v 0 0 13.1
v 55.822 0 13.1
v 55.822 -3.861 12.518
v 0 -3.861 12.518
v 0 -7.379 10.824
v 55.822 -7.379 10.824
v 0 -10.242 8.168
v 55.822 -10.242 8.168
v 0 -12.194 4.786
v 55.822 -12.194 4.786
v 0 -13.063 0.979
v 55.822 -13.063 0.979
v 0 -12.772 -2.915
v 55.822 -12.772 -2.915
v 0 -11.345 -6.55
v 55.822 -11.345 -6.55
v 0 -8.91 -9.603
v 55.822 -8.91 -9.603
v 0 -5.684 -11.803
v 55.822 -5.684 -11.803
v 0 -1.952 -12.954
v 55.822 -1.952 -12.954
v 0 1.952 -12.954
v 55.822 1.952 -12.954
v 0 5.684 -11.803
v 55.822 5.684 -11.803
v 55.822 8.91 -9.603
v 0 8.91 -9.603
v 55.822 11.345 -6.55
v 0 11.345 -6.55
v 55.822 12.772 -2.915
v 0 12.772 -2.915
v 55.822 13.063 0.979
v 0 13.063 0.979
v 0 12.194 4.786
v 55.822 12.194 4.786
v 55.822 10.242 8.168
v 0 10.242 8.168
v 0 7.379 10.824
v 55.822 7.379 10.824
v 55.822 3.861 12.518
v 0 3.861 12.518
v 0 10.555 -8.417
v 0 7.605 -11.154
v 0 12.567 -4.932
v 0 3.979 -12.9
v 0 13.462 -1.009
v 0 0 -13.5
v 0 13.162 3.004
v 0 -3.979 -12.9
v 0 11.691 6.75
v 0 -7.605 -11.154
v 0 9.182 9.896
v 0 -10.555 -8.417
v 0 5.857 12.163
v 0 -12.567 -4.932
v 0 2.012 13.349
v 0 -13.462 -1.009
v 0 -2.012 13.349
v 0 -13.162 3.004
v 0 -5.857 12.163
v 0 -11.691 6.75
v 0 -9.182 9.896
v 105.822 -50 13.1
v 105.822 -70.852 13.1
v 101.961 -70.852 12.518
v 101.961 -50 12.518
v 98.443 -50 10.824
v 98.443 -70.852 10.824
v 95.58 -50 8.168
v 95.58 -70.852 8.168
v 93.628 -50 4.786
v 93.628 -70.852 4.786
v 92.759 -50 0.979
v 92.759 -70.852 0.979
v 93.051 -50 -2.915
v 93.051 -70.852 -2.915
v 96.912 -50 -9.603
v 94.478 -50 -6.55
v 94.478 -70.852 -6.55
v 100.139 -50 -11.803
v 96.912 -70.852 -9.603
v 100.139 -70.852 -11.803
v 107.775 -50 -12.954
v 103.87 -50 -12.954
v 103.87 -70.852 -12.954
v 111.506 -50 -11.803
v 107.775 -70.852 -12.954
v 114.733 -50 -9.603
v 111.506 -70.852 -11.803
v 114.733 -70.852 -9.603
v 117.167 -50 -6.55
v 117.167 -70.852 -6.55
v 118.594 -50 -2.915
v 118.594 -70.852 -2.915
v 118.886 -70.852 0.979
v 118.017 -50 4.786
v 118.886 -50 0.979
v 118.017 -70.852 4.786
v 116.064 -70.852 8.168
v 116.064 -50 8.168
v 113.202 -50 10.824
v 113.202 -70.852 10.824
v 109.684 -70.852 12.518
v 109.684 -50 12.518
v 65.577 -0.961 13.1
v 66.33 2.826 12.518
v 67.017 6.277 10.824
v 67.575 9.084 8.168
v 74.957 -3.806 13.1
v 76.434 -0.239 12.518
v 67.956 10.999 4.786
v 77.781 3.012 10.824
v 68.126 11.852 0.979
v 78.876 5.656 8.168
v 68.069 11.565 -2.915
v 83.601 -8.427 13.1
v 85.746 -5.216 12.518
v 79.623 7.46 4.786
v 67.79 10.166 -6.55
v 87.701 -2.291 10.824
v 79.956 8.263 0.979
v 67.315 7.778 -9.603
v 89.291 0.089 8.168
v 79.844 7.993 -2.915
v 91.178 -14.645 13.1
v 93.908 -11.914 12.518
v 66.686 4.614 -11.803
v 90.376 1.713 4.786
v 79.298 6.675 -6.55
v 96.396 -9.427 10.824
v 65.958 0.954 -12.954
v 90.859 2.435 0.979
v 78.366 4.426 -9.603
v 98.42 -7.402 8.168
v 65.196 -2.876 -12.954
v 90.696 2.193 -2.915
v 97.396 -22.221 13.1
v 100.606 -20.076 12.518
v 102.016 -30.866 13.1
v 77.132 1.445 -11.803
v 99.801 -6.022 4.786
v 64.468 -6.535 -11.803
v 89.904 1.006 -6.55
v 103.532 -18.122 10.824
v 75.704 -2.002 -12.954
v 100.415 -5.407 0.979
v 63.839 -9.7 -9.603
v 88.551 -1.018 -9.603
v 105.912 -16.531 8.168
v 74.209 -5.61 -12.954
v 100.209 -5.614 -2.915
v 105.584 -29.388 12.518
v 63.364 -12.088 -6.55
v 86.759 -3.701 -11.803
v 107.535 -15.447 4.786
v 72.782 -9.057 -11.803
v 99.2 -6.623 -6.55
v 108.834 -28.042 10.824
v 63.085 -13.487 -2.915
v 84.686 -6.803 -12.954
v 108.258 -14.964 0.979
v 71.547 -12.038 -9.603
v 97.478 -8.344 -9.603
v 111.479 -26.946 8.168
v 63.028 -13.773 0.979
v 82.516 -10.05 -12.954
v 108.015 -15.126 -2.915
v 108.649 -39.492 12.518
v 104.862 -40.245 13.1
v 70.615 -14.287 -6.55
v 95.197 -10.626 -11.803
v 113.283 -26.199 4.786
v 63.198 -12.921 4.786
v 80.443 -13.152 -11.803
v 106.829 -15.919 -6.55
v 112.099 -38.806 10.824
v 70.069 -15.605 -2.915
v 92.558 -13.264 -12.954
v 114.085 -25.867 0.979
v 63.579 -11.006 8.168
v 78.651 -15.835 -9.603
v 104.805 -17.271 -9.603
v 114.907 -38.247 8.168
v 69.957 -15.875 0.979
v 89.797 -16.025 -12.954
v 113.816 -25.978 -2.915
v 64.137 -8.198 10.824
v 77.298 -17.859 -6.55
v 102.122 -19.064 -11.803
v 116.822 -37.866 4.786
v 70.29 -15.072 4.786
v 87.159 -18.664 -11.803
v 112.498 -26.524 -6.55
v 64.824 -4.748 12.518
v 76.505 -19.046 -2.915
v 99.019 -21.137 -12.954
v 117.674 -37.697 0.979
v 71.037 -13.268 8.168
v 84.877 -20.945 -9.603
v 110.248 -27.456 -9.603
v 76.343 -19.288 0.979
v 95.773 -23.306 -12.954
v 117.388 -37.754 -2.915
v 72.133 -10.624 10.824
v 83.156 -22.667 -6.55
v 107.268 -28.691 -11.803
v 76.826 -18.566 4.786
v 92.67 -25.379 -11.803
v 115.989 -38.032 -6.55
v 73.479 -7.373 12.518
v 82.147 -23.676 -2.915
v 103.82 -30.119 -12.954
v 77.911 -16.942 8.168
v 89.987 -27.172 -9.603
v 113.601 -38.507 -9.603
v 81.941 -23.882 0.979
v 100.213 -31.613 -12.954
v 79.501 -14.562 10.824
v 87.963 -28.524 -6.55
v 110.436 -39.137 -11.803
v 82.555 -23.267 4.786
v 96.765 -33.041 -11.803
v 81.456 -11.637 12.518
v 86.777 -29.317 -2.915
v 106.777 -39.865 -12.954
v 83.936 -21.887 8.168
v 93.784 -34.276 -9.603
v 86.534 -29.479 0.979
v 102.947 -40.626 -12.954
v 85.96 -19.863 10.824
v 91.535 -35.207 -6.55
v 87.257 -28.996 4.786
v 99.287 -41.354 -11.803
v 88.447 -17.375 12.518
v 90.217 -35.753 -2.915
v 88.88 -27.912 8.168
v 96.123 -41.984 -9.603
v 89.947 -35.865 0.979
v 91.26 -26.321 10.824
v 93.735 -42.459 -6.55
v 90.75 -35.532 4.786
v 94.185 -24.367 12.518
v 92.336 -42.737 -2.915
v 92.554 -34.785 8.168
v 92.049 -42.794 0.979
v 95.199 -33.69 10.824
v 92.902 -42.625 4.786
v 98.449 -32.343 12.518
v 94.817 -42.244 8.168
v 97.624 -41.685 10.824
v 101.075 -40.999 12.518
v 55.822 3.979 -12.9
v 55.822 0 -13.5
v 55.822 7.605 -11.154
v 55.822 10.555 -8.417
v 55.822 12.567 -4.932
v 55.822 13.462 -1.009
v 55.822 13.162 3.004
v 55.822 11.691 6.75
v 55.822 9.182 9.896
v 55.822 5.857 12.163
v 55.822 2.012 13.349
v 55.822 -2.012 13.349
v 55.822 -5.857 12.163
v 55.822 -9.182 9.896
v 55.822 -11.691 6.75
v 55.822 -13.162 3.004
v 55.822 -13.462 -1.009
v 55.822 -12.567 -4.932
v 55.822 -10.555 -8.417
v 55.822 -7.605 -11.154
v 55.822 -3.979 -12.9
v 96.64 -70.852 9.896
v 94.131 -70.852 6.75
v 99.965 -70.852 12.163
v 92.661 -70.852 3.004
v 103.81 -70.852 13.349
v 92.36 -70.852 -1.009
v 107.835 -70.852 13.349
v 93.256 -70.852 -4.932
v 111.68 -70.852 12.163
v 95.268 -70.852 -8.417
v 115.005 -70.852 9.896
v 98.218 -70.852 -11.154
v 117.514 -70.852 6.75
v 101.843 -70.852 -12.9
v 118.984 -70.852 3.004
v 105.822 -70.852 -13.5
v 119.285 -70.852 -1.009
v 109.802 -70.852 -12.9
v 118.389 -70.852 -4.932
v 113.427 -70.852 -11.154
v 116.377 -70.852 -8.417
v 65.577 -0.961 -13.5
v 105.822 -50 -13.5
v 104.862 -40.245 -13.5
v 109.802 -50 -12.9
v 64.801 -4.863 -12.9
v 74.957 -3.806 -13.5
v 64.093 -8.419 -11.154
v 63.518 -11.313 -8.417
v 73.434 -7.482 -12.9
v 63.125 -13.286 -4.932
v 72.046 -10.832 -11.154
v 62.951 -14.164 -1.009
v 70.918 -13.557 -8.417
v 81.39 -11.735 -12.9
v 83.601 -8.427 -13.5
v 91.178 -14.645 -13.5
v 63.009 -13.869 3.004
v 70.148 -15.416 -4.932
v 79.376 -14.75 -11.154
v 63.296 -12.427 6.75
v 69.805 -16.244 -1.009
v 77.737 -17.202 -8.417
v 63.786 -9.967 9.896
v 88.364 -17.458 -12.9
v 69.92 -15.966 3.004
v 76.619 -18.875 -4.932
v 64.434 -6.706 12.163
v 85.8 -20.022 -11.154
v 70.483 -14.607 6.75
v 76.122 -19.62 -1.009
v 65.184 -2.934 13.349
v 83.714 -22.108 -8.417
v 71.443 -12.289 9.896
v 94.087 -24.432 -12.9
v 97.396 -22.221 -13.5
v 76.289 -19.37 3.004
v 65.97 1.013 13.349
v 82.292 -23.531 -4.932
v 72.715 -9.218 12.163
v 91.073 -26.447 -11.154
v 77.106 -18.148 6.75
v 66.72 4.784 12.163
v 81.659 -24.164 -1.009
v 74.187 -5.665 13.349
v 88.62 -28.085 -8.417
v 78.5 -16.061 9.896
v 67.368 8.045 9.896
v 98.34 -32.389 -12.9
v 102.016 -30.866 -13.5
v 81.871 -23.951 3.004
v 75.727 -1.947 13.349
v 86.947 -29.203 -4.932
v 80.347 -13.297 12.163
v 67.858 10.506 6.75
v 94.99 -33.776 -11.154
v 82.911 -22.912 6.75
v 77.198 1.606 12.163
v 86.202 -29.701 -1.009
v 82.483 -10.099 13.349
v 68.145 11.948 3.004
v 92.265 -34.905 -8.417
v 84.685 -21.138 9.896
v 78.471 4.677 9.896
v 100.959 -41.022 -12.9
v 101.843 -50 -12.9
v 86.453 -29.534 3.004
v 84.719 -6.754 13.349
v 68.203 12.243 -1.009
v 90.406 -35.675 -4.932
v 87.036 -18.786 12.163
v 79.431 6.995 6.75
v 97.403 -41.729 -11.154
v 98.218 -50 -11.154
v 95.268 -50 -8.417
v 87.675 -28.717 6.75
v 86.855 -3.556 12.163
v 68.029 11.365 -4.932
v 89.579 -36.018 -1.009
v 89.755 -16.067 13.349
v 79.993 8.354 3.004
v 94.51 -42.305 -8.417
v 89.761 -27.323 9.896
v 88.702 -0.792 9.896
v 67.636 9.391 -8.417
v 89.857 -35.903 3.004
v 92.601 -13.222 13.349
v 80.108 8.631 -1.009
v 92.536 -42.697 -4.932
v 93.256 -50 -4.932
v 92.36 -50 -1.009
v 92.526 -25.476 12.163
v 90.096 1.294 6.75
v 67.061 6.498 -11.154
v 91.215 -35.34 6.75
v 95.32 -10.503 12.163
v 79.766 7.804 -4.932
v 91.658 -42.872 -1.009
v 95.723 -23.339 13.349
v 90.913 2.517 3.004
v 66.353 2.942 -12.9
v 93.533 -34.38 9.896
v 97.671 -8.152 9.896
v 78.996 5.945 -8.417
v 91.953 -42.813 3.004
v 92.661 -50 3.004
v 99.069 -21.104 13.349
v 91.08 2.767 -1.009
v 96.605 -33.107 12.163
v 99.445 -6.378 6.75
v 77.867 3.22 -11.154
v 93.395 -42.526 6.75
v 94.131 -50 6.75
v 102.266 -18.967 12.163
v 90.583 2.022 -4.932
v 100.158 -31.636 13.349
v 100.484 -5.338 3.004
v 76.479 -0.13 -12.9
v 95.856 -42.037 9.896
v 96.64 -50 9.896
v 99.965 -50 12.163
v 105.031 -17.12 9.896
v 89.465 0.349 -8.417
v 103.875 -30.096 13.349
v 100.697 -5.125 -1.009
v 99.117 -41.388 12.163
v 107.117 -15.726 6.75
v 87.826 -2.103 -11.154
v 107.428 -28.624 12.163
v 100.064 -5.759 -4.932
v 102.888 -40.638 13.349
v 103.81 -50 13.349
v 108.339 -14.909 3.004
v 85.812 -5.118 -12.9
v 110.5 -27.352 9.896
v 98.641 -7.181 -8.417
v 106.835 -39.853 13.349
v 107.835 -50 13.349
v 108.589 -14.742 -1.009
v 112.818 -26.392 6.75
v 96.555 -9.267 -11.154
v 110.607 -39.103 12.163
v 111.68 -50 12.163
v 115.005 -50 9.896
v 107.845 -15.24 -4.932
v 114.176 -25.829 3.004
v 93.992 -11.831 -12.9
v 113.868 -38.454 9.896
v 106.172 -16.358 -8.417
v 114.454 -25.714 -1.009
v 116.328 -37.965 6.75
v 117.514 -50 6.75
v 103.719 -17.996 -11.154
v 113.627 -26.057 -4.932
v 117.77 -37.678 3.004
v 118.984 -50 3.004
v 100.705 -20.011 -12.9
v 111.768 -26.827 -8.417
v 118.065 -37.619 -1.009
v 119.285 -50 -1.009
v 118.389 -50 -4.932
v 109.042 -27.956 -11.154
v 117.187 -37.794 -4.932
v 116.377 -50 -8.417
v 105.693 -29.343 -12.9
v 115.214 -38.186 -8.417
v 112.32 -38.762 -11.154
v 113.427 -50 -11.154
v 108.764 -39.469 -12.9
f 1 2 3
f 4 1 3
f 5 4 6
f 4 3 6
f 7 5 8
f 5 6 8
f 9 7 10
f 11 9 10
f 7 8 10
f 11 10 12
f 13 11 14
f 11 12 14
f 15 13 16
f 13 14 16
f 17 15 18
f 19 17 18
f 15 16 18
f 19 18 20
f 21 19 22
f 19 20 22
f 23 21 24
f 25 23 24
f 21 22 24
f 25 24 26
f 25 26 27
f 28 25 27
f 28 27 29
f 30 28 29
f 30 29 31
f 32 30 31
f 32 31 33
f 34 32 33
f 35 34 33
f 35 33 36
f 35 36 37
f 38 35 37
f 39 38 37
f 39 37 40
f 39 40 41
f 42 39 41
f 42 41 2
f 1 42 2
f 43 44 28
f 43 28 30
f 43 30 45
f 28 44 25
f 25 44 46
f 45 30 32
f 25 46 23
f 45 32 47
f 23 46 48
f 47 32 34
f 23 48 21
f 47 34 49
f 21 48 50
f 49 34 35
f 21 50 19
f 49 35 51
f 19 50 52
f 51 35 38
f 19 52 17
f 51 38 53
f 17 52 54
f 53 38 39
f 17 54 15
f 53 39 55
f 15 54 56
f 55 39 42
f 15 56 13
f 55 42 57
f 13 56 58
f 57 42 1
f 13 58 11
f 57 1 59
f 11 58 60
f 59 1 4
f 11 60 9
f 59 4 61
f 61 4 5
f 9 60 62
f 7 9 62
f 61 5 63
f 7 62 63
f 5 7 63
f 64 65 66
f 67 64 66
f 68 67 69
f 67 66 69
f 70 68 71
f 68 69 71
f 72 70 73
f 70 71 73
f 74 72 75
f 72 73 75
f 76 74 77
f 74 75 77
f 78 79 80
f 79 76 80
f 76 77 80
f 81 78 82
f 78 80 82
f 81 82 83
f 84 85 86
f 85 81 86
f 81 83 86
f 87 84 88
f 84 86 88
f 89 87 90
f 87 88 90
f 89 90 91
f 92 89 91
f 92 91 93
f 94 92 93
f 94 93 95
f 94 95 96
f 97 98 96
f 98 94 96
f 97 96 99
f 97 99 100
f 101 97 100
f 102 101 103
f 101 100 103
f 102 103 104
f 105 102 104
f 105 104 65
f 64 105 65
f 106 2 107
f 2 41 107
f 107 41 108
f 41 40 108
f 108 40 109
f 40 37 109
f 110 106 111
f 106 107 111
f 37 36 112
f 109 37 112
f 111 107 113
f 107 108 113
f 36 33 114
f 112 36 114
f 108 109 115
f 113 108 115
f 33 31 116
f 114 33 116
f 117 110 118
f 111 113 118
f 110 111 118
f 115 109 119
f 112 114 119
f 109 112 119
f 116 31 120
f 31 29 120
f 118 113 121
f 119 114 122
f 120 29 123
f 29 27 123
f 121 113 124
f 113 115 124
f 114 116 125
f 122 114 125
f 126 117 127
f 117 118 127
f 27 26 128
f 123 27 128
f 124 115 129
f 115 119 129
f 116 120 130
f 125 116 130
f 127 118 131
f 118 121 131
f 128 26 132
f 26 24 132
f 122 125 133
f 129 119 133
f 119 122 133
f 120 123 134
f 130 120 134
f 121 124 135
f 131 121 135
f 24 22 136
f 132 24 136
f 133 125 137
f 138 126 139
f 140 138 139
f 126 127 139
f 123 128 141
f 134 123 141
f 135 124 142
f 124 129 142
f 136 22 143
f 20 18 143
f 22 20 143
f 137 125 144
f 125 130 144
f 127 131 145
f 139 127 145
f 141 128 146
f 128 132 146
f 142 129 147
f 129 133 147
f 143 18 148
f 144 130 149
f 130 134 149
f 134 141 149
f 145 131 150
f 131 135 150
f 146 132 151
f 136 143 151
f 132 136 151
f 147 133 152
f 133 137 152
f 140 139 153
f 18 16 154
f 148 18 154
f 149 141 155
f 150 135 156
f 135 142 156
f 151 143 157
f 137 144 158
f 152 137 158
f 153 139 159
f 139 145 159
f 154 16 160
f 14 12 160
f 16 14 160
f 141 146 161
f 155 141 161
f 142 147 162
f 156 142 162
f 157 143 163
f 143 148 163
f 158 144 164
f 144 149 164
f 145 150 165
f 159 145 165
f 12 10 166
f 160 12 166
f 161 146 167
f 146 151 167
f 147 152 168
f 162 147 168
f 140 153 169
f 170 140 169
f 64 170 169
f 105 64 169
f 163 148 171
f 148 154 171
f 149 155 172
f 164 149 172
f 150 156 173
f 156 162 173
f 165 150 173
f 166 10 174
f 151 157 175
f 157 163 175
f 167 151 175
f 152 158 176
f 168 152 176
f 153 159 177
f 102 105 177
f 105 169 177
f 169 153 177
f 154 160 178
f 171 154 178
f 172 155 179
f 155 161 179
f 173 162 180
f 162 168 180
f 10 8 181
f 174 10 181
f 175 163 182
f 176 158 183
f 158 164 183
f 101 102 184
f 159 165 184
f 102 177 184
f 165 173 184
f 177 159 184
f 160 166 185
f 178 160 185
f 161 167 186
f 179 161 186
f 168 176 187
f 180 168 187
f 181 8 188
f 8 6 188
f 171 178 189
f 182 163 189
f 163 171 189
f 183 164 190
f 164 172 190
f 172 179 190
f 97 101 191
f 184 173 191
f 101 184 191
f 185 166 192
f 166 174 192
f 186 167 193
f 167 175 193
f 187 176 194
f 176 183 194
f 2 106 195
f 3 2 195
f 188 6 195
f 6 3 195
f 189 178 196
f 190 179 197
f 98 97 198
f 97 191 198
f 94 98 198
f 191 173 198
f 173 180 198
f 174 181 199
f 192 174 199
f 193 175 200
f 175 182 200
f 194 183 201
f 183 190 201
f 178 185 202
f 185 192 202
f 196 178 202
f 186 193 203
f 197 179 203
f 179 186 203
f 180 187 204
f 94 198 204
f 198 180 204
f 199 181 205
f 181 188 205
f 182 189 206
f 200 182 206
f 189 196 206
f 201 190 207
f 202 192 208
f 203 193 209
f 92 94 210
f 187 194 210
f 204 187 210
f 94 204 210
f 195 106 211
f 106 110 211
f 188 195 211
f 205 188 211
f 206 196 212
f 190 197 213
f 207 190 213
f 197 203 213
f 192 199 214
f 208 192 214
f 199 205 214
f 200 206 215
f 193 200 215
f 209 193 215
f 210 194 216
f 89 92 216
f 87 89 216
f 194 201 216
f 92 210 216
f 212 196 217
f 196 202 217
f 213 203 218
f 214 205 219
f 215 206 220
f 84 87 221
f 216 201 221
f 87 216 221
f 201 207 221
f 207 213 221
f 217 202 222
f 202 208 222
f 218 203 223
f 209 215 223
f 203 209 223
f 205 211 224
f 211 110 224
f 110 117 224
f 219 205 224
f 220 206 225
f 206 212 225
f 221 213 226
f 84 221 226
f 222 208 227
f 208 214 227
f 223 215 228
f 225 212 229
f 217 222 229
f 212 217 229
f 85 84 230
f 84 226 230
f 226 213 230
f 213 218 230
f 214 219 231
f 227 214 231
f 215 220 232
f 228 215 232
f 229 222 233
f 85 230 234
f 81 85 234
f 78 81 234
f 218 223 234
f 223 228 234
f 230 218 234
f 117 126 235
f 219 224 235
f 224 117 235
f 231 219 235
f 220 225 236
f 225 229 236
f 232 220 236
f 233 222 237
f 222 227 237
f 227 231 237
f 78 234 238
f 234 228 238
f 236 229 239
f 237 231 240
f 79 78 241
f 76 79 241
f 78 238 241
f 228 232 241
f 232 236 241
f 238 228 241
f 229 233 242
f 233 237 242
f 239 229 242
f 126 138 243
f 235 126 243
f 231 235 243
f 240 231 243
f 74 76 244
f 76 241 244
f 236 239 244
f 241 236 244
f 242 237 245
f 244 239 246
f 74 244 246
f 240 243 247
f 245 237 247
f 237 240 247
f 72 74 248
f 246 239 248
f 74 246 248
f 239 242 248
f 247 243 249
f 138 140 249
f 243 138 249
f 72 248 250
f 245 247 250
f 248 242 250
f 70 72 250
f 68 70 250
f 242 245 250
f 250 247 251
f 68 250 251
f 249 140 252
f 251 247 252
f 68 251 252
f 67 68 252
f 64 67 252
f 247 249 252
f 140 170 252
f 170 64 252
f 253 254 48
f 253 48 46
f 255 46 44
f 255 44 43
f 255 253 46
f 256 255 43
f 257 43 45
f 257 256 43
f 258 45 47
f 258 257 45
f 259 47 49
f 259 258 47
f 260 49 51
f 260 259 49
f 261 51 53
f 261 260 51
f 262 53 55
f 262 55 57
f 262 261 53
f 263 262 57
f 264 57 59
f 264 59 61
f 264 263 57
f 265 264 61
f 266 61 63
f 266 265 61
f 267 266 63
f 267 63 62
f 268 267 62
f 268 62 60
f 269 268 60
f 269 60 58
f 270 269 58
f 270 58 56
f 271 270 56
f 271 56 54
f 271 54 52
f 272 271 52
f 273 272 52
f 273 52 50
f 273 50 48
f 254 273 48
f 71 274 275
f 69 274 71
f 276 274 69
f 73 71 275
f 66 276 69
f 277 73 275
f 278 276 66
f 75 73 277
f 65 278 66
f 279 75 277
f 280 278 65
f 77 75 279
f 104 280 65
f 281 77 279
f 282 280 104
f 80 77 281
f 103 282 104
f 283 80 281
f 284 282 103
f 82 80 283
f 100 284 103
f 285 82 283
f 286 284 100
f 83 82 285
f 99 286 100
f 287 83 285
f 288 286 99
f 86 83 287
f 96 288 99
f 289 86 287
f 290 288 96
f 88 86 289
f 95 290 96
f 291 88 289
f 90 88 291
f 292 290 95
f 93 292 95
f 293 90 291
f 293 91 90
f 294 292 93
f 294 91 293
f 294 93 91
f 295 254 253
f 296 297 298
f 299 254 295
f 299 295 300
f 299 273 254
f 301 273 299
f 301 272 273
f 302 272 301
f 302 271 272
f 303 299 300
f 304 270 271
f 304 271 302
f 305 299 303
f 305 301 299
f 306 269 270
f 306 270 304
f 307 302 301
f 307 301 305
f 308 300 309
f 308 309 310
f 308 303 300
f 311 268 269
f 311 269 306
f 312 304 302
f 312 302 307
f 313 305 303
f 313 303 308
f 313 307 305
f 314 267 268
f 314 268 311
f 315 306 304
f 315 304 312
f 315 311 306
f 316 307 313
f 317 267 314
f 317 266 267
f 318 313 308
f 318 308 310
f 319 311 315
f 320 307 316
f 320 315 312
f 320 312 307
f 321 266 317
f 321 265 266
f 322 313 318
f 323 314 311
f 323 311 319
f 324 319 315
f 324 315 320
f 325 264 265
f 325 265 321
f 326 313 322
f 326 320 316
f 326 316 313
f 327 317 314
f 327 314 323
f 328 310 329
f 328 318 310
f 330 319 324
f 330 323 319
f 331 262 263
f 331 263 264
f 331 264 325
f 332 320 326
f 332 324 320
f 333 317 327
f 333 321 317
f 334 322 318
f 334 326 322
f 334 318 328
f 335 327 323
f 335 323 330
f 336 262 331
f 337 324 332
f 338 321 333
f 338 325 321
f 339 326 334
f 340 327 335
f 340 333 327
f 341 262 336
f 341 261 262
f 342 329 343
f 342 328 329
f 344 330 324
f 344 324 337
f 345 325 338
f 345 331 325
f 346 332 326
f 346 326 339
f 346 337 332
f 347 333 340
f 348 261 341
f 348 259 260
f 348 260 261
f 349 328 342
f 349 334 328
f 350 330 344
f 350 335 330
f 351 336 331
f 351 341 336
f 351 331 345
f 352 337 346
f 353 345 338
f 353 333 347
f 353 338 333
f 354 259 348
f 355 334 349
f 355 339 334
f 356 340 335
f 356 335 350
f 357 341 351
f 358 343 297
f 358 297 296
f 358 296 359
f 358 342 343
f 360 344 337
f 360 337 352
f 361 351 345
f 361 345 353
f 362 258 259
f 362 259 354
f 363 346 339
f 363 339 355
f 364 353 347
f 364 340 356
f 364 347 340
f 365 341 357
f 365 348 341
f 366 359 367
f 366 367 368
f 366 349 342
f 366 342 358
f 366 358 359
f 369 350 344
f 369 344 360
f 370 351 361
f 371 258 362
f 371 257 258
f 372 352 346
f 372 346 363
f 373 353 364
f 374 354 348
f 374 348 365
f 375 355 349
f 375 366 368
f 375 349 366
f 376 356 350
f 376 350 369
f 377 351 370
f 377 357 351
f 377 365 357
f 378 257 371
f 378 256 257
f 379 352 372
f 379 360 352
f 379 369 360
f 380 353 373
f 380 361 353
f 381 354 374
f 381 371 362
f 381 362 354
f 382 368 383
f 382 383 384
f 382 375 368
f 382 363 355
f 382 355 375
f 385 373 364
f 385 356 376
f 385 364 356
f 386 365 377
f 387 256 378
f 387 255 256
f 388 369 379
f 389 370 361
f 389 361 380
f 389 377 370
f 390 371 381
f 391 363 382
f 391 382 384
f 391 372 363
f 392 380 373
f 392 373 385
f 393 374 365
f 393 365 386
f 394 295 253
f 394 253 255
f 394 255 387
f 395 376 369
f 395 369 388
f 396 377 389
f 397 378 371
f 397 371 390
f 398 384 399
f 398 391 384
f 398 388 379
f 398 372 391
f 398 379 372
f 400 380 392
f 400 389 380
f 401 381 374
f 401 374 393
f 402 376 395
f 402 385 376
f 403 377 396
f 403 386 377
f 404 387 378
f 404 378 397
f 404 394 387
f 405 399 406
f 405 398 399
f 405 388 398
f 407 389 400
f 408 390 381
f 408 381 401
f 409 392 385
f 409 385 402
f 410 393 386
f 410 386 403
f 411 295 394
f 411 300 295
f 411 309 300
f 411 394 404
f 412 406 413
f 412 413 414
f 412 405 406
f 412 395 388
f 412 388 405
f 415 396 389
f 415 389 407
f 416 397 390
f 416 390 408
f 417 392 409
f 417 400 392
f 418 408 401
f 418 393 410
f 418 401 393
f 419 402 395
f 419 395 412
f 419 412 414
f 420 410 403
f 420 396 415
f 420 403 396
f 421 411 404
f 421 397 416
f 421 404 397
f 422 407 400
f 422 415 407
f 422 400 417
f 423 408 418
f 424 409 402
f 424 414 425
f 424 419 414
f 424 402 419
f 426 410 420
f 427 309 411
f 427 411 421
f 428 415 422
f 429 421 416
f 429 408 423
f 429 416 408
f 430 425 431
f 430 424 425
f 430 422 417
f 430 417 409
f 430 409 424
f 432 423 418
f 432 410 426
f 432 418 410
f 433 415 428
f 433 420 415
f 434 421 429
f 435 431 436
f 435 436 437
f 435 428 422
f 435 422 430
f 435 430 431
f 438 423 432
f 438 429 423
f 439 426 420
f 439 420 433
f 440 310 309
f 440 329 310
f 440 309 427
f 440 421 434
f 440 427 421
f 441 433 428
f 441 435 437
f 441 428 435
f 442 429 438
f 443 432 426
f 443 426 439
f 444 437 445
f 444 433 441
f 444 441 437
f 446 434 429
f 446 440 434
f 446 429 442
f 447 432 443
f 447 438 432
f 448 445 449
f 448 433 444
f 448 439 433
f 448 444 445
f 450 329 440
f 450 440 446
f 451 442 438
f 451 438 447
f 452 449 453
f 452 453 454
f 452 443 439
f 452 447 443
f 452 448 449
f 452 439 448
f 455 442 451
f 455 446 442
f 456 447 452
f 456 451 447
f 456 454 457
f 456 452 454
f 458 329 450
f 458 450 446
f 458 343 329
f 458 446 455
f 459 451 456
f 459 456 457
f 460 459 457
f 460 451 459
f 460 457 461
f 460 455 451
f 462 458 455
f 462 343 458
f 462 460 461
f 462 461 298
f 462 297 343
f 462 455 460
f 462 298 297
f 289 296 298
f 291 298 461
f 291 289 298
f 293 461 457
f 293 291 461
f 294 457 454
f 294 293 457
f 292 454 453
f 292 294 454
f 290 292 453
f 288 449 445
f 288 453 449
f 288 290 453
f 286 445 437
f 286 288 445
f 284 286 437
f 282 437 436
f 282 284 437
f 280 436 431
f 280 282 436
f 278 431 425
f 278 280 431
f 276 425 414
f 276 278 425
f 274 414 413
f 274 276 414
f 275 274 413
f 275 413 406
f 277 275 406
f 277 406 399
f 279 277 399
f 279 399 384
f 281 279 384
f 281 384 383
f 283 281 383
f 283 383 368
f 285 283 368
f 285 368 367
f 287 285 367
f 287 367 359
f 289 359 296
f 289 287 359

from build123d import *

# Parameters (mm, degrees)
SKETCH2_R = 13.5
SKETCH3_R = 13.1


with BuildPart() as part:
    # Sweep1: sweep along a path in Sketch1
    with BuildLine(Plane.XY) as sweep1_path:
        Line((0, 0), (55.82246027, 0))
        ThreePointArc((55.82246027, 0), (91.17779933, -14.644660941), (105.82246027, -50))
        Line((105.82246027, -50), (105.82246027, -70.851970701))
    # Sketch2 → Sweep1 (sweep)
    with BuildSketch(Plane(origin=(0, 0, 0), x_dir=(0, 0, -1), z_dir=(1, 0, 0))):
        Circle(SKETCH2_R)
    sweep(path=sweep1_path.line)

    # Cut-Sweep1: sweep along a path in Sketch1<2>
    with BuildLine(Plane.XY) as cut_sweep1_path:
        Line((0, 0), (55.82246027, 0))
        ThreePointArc((55.82246027, 0), (91.17779933, -14.644660941), (105.82246027, -50))
        Line((105.82246027, -50), (105.82246027, -70.851970701))
    # Sketch3 → Cut-Sweep1 (sweep, cut)
    with BuildSketch(Plane.ZY):
        Circle(SKETCH3_R)
    sweep(path=cut_sweep1_path.line, mode=Mode.SUBTRACT)


solid = part.part
